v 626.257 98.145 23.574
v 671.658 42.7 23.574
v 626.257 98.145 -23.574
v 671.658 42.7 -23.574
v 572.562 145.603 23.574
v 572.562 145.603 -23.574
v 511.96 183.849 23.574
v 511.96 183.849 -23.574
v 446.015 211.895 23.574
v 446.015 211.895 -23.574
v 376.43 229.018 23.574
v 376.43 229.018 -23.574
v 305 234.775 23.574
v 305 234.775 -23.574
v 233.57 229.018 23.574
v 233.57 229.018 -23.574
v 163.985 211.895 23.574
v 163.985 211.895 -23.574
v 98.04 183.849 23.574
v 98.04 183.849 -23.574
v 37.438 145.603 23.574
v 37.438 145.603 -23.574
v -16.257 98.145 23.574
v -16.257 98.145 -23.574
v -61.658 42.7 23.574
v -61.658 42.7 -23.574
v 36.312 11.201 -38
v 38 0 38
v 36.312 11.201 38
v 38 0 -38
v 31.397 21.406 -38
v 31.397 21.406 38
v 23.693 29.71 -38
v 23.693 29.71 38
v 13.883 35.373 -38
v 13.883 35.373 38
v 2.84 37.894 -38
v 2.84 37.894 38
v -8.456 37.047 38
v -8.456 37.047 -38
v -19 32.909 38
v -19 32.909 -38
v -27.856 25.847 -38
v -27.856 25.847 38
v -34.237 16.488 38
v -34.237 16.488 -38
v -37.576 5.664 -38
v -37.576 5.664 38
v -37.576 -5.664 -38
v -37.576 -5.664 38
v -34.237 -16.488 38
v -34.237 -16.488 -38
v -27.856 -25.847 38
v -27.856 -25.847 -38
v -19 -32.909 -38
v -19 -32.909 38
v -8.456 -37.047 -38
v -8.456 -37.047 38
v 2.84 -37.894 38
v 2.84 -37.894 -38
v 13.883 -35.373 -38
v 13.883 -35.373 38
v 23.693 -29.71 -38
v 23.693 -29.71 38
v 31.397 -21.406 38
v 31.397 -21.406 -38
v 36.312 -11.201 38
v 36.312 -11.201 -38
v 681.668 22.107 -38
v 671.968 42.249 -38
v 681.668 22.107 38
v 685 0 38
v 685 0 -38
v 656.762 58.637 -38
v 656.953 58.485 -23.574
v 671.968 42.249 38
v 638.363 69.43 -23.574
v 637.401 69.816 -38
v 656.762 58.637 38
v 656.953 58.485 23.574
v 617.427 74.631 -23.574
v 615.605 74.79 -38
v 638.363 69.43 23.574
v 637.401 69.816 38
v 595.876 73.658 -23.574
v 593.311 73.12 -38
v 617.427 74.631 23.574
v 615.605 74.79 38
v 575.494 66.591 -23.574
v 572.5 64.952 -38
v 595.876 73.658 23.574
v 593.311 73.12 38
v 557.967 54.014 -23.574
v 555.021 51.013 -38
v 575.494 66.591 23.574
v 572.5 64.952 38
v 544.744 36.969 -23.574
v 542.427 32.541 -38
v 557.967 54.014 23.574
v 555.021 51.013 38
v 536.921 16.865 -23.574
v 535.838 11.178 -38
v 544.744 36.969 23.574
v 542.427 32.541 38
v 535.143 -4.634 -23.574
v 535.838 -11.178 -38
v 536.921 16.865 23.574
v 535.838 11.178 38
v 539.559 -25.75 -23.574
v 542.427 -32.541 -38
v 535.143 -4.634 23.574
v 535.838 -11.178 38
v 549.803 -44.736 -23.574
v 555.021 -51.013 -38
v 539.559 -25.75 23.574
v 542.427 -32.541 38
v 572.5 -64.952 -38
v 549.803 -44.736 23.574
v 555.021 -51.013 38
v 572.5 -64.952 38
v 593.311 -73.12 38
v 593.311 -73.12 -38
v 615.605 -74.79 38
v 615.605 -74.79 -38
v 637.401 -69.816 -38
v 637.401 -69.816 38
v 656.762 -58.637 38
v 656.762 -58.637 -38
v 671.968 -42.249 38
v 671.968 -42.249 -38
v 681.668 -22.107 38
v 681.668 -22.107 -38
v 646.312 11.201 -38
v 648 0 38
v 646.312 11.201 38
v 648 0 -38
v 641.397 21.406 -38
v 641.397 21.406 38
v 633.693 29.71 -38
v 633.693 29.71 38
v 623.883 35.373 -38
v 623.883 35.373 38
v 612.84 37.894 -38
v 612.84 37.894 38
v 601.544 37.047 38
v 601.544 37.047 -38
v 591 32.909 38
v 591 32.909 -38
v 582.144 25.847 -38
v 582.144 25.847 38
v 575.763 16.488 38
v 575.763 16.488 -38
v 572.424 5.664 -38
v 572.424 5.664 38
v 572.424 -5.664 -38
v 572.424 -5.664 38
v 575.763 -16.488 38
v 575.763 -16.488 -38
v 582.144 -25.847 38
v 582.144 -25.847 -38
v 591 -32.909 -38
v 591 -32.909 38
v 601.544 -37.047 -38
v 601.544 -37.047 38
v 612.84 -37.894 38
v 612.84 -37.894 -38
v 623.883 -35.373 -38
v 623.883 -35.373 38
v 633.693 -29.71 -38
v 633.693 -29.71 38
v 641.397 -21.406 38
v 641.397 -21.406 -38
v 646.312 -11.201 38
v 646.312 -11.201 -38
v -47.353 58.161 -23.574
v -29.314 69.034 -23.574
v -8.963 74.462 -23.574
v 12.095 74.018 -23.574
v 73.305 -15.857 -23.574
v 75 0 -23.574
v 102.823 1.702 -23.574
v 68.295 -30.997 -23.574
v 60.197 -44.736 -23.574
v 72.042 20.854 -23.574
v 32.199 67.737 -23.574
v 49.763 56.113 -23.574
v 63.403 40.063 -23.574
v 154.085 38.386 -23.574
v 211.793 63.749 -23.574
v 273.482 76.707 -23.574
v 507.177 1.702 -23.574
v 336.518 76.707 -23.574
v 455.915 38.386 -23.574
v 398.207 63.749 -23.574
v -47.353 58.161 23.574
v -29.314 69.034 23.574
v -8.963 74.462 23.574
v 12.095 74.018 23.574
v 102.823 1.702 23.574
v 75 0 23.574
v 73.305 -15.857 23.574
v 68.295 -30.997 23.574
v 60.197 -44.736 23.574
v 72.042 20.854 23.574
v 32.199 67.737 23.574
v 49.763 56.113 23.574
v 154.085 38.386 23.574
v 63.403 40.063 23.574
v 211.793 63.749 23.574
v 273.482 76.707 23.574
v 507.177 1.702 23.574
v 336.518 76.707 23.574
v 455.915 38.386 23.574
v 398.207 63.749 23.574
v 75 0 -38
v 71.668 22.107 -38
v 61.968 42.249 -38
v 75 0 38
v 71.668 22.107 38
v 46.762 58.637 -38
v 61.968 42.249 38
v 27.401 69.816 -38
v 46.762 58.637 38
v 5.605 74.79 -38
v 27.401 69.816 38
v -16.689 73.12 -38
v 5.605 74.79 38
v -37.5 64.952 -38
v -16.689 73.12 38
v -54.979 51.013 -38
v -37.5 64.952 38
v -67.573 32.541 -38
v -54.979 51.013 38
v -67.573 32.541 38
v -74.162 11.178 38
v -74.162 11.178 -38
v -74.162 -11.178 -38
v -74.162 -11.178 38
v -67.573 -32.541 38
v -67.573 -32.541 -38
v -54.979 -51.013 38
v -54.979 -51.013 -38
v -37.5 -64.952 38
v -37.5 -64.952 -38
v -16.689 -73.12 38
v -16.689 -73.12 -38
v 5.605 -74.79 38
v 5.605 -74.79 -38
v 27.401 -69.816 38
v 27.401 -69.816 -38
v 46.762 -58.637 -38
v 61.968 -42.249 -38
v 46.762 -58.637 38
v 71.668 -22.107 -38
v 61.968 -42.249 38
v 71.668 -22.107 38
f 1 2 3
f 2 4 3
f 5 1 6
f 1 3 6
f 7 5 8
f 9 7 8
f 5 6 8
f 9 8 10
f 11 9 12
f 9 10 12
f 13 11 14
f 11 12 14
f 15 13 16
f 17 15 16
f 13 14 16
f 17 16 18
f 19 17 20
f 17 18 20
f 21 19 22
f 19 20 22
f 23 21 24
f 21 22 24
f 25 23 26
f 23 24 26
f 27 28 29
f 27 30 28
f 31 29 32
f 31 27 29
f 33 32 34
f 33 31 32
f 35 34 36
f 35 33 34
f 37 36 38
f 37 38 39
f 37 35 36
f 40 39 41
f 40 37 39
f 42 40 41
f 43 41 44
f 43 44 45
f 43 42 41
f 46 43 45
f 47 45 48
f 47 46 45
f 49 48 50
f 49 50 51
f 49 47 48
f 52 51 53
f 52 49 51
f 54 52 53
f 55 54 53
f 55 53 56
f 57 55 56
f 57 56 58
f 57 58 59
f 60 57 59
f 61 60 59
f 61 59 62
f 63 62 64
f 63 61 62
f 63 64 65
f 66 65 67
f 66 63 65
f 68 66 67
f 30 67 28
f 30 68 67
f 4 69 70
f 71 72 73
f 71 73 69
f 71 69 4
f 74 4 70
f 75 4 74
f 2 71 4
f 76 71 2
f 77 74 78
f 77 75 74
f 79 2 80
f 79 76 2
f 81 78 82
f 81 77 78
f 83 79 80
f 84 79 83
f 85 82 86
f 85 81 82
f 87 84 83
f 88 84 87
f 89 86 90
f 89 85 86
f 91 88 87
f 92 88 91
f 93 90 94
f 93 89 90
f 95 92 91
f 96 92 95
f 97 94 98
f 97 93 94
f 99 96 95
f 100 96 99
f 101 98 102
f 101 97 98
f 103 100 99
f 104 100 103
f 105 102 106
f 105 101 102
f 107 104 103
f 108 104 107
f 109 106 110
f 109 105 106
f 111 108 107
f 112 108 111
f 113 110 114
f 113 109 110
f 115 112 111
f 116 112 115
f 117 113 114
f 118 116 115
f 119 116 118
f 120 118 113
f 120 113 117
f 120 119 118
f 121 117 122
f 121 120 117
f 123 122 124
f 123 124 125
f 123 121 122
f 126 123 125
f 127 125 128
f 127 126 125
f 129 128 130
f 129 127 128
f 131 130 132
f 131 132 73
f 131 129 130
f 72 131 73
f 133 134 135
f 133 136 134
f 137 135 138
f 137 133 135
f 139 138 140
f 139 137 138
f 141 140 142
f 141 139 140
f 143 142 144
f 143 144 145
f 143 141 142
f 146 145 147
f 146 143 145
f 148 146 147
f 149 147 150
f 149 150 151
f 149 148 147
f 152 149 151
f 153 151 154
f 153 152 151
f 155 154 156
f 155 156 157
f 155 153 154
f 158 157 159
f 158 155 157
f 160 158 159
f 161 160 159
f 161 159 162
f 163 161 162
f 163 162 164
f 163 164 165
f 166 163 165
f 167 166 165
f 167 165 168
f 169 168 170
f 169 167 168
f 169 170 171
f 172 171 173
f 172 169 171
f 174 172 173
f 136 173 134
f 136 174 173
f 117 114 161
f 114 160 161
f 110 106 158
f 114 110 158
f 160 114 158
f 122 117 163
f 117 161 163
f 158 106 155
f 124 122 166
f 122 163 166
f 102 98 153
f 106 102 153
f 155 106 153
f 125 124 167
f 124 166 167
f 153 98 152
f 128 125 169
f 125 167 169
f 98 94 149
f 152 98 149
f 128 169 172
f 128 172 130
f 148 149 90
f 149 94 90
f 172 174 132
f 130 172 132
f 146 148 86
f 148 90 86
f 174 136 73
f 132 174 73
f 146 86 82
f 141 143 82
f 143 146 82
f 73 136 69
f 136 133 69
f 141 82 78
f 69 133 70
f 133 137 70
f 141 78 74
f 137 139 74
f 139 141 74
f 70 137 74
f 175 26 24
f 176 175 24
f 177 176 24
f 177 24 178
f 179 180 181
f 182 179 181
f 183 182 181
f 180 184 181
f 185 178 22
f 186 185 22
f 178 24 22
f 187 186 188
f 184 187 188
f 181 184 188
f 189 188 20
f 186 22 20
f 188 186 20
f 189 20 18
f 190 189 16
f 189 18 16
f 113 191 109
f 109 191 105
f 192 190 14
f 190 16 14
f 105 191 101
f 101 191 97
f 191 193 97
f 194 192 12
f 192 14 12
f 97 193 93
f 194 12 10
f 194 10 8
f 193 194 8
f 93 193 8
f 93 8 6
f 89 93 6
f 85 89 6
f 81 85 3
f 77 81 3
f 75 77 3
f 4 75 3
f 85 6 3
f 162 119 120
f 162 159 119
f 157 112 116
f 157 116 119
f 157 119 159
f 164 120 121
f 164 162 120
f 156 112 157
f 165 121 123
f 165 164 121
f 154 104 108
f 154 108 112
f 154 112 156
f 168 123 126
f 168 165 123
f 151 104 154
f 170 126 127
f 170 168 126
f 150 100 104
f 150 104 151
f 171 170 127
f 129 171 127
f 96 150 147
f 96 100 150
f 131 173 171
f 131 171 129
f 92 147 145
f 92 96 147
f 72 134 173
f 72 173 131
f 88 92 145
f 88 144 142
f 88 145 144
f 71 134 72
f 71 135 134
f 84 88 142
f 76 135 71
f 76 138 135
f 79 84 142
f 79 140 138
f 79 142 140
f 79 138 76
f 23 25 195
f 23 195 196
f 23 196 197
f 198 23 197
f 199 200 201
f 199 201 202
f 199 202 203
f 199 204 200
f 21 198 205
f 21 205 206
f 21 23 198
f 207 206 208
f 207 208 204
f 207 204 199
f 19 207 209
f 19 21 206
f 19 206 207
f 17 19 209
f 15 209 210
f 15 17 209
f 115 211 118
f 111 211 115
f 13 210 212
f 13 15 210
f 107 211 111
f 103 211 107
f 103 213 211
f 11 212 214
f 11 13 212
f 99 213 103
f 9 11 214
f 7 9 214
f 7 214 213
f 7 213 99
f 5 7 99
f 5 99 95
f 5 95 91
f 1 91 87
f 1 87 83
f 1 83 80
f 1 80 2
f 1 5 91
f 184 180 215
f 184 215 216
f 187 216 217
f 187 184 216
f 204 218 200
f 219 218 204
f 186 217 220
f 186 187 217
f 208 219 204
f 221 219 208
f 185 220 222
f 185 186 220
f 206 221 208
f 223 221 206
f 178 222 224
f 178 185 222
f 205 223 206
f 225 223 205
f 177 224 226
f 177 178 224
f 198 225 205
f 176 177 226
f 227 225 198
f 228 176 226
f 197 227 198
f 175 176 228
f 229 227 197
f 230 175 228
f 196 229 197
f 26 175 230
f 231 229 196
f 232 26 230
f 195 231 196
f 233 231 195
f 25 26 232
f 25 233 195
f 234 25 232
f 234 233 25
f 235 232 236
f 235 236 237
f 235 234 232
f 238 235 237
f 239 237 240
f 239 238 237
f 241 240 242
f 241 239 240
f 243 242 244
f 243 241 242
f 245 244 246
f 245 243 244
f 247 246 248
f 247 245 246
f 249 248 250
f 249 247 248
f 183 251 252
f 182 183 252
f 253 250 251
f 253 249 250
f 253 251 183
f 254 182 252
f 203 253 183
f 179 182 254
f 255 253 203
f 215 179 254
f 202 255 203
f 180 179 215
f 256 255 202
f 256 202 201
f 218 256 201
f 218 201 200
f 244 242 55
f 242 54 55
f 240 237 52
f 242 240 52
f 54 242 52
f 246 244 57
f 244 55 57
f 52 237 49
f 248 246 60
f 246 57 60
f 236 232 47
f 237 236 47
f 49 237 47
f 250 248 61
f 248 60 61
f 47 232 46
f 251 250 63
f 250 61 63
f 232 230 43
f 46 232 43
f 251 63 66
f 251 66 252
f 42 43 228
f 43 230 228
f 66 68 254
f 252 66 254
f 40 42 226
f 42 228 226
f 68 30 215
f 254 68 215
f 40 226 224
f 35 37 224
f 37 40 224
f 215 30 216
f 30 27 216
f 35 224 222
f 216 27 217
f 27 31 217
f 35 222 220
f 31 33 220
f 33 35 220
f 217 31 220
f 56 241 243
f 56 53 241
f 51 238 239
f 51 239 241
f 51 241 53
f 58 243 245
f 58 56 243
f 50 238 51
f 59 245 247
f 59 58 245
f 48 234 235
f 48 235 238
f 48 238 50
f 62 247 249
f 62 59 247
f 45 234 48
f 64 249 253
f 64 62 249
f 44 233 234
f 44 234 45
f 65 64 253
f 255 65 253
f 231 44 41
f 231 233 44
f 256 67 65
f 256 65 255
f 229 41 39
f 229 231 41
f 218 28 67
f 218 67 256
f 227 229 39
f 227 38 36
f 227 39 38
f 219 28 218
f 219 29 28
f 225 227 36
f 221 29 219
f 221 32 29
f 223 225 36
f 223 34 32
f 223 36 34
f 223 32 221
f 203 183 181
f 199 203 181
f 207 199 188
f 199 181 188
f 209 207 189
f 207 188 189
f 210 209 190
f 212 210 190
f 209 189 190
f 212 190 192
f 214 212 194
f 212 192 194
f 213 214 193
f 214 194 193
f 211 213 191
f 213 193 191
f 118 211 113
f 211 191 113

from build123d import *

# Parameters (mm, degrees)
SKETCH1_R             = 75
SKETCH1_R_2           = 38
BOSS_EXTRUDE1_DEPTH   = 38
BOSS_EXTRUDE1_2_DEPTH = 38
BOSS_EXTRUDE2_DEPTH   = 23.574371523


with BuildPart() as part:
    # Sketch1 → Boss-Extrude1 (new, symmetric)
    with BuildSketch(Plane.XY):
        Circle(SKETCH1_R)
        Circle(SKETCH1_R_2, mode=Mode.SUBTRACT)
    extrude(amount=BOSS_EXTRUDE1_DEPTH, both=True)



with BuildPart() as body_2:
    # Sketch1 → Boss-Extrude1 2 (new, symmetric)
    with BuildSketch(Plane.XY):
        with Locations((610, 0)):
            Circle(SKETCH1_R)
        with Locations((610, 0)):
            Circle(SKETCH1_R_2, mode=Mode.SUBTRACT)
    extrude(amount=BOSS_EXTRUDE1_2_DEPTH, both=True)


with BuildPart() as part_1:
    add(part.part)

    add(body_2.part)  # Boss-Extrude2 merges body 2
    # Sketch2 → Boss-Extrude2 (add, symmetric)
    with BuildSketch(Plane.XY):
        with BuildLine():
            ThreePointArc((75, 0), (71.203239503, -23.560532341), (60.197368421, -44.735632724))
            ThreePointArc((60.197368421, -44.735632724), (305, 78.339460867), (549.802631579, -44.735632724))
            ThreePointArc((549.802631579, -44.735632724), (566.27585101, 60.936022147), (671.657681941, 42.700471399))
            ThreePointArc((671.657681941, 42.700471399), (305, 234.775001479), (-61.657681941, 42.700471399))
            ThreePointArc((-61.657681941, 42.700471399), (22.368212428, 71.586752076), (75, 0))
        make_face()
    extrude(amount=BOSS_EXTRUDE2_DEPTH, both=True)


solid = part_1.part
